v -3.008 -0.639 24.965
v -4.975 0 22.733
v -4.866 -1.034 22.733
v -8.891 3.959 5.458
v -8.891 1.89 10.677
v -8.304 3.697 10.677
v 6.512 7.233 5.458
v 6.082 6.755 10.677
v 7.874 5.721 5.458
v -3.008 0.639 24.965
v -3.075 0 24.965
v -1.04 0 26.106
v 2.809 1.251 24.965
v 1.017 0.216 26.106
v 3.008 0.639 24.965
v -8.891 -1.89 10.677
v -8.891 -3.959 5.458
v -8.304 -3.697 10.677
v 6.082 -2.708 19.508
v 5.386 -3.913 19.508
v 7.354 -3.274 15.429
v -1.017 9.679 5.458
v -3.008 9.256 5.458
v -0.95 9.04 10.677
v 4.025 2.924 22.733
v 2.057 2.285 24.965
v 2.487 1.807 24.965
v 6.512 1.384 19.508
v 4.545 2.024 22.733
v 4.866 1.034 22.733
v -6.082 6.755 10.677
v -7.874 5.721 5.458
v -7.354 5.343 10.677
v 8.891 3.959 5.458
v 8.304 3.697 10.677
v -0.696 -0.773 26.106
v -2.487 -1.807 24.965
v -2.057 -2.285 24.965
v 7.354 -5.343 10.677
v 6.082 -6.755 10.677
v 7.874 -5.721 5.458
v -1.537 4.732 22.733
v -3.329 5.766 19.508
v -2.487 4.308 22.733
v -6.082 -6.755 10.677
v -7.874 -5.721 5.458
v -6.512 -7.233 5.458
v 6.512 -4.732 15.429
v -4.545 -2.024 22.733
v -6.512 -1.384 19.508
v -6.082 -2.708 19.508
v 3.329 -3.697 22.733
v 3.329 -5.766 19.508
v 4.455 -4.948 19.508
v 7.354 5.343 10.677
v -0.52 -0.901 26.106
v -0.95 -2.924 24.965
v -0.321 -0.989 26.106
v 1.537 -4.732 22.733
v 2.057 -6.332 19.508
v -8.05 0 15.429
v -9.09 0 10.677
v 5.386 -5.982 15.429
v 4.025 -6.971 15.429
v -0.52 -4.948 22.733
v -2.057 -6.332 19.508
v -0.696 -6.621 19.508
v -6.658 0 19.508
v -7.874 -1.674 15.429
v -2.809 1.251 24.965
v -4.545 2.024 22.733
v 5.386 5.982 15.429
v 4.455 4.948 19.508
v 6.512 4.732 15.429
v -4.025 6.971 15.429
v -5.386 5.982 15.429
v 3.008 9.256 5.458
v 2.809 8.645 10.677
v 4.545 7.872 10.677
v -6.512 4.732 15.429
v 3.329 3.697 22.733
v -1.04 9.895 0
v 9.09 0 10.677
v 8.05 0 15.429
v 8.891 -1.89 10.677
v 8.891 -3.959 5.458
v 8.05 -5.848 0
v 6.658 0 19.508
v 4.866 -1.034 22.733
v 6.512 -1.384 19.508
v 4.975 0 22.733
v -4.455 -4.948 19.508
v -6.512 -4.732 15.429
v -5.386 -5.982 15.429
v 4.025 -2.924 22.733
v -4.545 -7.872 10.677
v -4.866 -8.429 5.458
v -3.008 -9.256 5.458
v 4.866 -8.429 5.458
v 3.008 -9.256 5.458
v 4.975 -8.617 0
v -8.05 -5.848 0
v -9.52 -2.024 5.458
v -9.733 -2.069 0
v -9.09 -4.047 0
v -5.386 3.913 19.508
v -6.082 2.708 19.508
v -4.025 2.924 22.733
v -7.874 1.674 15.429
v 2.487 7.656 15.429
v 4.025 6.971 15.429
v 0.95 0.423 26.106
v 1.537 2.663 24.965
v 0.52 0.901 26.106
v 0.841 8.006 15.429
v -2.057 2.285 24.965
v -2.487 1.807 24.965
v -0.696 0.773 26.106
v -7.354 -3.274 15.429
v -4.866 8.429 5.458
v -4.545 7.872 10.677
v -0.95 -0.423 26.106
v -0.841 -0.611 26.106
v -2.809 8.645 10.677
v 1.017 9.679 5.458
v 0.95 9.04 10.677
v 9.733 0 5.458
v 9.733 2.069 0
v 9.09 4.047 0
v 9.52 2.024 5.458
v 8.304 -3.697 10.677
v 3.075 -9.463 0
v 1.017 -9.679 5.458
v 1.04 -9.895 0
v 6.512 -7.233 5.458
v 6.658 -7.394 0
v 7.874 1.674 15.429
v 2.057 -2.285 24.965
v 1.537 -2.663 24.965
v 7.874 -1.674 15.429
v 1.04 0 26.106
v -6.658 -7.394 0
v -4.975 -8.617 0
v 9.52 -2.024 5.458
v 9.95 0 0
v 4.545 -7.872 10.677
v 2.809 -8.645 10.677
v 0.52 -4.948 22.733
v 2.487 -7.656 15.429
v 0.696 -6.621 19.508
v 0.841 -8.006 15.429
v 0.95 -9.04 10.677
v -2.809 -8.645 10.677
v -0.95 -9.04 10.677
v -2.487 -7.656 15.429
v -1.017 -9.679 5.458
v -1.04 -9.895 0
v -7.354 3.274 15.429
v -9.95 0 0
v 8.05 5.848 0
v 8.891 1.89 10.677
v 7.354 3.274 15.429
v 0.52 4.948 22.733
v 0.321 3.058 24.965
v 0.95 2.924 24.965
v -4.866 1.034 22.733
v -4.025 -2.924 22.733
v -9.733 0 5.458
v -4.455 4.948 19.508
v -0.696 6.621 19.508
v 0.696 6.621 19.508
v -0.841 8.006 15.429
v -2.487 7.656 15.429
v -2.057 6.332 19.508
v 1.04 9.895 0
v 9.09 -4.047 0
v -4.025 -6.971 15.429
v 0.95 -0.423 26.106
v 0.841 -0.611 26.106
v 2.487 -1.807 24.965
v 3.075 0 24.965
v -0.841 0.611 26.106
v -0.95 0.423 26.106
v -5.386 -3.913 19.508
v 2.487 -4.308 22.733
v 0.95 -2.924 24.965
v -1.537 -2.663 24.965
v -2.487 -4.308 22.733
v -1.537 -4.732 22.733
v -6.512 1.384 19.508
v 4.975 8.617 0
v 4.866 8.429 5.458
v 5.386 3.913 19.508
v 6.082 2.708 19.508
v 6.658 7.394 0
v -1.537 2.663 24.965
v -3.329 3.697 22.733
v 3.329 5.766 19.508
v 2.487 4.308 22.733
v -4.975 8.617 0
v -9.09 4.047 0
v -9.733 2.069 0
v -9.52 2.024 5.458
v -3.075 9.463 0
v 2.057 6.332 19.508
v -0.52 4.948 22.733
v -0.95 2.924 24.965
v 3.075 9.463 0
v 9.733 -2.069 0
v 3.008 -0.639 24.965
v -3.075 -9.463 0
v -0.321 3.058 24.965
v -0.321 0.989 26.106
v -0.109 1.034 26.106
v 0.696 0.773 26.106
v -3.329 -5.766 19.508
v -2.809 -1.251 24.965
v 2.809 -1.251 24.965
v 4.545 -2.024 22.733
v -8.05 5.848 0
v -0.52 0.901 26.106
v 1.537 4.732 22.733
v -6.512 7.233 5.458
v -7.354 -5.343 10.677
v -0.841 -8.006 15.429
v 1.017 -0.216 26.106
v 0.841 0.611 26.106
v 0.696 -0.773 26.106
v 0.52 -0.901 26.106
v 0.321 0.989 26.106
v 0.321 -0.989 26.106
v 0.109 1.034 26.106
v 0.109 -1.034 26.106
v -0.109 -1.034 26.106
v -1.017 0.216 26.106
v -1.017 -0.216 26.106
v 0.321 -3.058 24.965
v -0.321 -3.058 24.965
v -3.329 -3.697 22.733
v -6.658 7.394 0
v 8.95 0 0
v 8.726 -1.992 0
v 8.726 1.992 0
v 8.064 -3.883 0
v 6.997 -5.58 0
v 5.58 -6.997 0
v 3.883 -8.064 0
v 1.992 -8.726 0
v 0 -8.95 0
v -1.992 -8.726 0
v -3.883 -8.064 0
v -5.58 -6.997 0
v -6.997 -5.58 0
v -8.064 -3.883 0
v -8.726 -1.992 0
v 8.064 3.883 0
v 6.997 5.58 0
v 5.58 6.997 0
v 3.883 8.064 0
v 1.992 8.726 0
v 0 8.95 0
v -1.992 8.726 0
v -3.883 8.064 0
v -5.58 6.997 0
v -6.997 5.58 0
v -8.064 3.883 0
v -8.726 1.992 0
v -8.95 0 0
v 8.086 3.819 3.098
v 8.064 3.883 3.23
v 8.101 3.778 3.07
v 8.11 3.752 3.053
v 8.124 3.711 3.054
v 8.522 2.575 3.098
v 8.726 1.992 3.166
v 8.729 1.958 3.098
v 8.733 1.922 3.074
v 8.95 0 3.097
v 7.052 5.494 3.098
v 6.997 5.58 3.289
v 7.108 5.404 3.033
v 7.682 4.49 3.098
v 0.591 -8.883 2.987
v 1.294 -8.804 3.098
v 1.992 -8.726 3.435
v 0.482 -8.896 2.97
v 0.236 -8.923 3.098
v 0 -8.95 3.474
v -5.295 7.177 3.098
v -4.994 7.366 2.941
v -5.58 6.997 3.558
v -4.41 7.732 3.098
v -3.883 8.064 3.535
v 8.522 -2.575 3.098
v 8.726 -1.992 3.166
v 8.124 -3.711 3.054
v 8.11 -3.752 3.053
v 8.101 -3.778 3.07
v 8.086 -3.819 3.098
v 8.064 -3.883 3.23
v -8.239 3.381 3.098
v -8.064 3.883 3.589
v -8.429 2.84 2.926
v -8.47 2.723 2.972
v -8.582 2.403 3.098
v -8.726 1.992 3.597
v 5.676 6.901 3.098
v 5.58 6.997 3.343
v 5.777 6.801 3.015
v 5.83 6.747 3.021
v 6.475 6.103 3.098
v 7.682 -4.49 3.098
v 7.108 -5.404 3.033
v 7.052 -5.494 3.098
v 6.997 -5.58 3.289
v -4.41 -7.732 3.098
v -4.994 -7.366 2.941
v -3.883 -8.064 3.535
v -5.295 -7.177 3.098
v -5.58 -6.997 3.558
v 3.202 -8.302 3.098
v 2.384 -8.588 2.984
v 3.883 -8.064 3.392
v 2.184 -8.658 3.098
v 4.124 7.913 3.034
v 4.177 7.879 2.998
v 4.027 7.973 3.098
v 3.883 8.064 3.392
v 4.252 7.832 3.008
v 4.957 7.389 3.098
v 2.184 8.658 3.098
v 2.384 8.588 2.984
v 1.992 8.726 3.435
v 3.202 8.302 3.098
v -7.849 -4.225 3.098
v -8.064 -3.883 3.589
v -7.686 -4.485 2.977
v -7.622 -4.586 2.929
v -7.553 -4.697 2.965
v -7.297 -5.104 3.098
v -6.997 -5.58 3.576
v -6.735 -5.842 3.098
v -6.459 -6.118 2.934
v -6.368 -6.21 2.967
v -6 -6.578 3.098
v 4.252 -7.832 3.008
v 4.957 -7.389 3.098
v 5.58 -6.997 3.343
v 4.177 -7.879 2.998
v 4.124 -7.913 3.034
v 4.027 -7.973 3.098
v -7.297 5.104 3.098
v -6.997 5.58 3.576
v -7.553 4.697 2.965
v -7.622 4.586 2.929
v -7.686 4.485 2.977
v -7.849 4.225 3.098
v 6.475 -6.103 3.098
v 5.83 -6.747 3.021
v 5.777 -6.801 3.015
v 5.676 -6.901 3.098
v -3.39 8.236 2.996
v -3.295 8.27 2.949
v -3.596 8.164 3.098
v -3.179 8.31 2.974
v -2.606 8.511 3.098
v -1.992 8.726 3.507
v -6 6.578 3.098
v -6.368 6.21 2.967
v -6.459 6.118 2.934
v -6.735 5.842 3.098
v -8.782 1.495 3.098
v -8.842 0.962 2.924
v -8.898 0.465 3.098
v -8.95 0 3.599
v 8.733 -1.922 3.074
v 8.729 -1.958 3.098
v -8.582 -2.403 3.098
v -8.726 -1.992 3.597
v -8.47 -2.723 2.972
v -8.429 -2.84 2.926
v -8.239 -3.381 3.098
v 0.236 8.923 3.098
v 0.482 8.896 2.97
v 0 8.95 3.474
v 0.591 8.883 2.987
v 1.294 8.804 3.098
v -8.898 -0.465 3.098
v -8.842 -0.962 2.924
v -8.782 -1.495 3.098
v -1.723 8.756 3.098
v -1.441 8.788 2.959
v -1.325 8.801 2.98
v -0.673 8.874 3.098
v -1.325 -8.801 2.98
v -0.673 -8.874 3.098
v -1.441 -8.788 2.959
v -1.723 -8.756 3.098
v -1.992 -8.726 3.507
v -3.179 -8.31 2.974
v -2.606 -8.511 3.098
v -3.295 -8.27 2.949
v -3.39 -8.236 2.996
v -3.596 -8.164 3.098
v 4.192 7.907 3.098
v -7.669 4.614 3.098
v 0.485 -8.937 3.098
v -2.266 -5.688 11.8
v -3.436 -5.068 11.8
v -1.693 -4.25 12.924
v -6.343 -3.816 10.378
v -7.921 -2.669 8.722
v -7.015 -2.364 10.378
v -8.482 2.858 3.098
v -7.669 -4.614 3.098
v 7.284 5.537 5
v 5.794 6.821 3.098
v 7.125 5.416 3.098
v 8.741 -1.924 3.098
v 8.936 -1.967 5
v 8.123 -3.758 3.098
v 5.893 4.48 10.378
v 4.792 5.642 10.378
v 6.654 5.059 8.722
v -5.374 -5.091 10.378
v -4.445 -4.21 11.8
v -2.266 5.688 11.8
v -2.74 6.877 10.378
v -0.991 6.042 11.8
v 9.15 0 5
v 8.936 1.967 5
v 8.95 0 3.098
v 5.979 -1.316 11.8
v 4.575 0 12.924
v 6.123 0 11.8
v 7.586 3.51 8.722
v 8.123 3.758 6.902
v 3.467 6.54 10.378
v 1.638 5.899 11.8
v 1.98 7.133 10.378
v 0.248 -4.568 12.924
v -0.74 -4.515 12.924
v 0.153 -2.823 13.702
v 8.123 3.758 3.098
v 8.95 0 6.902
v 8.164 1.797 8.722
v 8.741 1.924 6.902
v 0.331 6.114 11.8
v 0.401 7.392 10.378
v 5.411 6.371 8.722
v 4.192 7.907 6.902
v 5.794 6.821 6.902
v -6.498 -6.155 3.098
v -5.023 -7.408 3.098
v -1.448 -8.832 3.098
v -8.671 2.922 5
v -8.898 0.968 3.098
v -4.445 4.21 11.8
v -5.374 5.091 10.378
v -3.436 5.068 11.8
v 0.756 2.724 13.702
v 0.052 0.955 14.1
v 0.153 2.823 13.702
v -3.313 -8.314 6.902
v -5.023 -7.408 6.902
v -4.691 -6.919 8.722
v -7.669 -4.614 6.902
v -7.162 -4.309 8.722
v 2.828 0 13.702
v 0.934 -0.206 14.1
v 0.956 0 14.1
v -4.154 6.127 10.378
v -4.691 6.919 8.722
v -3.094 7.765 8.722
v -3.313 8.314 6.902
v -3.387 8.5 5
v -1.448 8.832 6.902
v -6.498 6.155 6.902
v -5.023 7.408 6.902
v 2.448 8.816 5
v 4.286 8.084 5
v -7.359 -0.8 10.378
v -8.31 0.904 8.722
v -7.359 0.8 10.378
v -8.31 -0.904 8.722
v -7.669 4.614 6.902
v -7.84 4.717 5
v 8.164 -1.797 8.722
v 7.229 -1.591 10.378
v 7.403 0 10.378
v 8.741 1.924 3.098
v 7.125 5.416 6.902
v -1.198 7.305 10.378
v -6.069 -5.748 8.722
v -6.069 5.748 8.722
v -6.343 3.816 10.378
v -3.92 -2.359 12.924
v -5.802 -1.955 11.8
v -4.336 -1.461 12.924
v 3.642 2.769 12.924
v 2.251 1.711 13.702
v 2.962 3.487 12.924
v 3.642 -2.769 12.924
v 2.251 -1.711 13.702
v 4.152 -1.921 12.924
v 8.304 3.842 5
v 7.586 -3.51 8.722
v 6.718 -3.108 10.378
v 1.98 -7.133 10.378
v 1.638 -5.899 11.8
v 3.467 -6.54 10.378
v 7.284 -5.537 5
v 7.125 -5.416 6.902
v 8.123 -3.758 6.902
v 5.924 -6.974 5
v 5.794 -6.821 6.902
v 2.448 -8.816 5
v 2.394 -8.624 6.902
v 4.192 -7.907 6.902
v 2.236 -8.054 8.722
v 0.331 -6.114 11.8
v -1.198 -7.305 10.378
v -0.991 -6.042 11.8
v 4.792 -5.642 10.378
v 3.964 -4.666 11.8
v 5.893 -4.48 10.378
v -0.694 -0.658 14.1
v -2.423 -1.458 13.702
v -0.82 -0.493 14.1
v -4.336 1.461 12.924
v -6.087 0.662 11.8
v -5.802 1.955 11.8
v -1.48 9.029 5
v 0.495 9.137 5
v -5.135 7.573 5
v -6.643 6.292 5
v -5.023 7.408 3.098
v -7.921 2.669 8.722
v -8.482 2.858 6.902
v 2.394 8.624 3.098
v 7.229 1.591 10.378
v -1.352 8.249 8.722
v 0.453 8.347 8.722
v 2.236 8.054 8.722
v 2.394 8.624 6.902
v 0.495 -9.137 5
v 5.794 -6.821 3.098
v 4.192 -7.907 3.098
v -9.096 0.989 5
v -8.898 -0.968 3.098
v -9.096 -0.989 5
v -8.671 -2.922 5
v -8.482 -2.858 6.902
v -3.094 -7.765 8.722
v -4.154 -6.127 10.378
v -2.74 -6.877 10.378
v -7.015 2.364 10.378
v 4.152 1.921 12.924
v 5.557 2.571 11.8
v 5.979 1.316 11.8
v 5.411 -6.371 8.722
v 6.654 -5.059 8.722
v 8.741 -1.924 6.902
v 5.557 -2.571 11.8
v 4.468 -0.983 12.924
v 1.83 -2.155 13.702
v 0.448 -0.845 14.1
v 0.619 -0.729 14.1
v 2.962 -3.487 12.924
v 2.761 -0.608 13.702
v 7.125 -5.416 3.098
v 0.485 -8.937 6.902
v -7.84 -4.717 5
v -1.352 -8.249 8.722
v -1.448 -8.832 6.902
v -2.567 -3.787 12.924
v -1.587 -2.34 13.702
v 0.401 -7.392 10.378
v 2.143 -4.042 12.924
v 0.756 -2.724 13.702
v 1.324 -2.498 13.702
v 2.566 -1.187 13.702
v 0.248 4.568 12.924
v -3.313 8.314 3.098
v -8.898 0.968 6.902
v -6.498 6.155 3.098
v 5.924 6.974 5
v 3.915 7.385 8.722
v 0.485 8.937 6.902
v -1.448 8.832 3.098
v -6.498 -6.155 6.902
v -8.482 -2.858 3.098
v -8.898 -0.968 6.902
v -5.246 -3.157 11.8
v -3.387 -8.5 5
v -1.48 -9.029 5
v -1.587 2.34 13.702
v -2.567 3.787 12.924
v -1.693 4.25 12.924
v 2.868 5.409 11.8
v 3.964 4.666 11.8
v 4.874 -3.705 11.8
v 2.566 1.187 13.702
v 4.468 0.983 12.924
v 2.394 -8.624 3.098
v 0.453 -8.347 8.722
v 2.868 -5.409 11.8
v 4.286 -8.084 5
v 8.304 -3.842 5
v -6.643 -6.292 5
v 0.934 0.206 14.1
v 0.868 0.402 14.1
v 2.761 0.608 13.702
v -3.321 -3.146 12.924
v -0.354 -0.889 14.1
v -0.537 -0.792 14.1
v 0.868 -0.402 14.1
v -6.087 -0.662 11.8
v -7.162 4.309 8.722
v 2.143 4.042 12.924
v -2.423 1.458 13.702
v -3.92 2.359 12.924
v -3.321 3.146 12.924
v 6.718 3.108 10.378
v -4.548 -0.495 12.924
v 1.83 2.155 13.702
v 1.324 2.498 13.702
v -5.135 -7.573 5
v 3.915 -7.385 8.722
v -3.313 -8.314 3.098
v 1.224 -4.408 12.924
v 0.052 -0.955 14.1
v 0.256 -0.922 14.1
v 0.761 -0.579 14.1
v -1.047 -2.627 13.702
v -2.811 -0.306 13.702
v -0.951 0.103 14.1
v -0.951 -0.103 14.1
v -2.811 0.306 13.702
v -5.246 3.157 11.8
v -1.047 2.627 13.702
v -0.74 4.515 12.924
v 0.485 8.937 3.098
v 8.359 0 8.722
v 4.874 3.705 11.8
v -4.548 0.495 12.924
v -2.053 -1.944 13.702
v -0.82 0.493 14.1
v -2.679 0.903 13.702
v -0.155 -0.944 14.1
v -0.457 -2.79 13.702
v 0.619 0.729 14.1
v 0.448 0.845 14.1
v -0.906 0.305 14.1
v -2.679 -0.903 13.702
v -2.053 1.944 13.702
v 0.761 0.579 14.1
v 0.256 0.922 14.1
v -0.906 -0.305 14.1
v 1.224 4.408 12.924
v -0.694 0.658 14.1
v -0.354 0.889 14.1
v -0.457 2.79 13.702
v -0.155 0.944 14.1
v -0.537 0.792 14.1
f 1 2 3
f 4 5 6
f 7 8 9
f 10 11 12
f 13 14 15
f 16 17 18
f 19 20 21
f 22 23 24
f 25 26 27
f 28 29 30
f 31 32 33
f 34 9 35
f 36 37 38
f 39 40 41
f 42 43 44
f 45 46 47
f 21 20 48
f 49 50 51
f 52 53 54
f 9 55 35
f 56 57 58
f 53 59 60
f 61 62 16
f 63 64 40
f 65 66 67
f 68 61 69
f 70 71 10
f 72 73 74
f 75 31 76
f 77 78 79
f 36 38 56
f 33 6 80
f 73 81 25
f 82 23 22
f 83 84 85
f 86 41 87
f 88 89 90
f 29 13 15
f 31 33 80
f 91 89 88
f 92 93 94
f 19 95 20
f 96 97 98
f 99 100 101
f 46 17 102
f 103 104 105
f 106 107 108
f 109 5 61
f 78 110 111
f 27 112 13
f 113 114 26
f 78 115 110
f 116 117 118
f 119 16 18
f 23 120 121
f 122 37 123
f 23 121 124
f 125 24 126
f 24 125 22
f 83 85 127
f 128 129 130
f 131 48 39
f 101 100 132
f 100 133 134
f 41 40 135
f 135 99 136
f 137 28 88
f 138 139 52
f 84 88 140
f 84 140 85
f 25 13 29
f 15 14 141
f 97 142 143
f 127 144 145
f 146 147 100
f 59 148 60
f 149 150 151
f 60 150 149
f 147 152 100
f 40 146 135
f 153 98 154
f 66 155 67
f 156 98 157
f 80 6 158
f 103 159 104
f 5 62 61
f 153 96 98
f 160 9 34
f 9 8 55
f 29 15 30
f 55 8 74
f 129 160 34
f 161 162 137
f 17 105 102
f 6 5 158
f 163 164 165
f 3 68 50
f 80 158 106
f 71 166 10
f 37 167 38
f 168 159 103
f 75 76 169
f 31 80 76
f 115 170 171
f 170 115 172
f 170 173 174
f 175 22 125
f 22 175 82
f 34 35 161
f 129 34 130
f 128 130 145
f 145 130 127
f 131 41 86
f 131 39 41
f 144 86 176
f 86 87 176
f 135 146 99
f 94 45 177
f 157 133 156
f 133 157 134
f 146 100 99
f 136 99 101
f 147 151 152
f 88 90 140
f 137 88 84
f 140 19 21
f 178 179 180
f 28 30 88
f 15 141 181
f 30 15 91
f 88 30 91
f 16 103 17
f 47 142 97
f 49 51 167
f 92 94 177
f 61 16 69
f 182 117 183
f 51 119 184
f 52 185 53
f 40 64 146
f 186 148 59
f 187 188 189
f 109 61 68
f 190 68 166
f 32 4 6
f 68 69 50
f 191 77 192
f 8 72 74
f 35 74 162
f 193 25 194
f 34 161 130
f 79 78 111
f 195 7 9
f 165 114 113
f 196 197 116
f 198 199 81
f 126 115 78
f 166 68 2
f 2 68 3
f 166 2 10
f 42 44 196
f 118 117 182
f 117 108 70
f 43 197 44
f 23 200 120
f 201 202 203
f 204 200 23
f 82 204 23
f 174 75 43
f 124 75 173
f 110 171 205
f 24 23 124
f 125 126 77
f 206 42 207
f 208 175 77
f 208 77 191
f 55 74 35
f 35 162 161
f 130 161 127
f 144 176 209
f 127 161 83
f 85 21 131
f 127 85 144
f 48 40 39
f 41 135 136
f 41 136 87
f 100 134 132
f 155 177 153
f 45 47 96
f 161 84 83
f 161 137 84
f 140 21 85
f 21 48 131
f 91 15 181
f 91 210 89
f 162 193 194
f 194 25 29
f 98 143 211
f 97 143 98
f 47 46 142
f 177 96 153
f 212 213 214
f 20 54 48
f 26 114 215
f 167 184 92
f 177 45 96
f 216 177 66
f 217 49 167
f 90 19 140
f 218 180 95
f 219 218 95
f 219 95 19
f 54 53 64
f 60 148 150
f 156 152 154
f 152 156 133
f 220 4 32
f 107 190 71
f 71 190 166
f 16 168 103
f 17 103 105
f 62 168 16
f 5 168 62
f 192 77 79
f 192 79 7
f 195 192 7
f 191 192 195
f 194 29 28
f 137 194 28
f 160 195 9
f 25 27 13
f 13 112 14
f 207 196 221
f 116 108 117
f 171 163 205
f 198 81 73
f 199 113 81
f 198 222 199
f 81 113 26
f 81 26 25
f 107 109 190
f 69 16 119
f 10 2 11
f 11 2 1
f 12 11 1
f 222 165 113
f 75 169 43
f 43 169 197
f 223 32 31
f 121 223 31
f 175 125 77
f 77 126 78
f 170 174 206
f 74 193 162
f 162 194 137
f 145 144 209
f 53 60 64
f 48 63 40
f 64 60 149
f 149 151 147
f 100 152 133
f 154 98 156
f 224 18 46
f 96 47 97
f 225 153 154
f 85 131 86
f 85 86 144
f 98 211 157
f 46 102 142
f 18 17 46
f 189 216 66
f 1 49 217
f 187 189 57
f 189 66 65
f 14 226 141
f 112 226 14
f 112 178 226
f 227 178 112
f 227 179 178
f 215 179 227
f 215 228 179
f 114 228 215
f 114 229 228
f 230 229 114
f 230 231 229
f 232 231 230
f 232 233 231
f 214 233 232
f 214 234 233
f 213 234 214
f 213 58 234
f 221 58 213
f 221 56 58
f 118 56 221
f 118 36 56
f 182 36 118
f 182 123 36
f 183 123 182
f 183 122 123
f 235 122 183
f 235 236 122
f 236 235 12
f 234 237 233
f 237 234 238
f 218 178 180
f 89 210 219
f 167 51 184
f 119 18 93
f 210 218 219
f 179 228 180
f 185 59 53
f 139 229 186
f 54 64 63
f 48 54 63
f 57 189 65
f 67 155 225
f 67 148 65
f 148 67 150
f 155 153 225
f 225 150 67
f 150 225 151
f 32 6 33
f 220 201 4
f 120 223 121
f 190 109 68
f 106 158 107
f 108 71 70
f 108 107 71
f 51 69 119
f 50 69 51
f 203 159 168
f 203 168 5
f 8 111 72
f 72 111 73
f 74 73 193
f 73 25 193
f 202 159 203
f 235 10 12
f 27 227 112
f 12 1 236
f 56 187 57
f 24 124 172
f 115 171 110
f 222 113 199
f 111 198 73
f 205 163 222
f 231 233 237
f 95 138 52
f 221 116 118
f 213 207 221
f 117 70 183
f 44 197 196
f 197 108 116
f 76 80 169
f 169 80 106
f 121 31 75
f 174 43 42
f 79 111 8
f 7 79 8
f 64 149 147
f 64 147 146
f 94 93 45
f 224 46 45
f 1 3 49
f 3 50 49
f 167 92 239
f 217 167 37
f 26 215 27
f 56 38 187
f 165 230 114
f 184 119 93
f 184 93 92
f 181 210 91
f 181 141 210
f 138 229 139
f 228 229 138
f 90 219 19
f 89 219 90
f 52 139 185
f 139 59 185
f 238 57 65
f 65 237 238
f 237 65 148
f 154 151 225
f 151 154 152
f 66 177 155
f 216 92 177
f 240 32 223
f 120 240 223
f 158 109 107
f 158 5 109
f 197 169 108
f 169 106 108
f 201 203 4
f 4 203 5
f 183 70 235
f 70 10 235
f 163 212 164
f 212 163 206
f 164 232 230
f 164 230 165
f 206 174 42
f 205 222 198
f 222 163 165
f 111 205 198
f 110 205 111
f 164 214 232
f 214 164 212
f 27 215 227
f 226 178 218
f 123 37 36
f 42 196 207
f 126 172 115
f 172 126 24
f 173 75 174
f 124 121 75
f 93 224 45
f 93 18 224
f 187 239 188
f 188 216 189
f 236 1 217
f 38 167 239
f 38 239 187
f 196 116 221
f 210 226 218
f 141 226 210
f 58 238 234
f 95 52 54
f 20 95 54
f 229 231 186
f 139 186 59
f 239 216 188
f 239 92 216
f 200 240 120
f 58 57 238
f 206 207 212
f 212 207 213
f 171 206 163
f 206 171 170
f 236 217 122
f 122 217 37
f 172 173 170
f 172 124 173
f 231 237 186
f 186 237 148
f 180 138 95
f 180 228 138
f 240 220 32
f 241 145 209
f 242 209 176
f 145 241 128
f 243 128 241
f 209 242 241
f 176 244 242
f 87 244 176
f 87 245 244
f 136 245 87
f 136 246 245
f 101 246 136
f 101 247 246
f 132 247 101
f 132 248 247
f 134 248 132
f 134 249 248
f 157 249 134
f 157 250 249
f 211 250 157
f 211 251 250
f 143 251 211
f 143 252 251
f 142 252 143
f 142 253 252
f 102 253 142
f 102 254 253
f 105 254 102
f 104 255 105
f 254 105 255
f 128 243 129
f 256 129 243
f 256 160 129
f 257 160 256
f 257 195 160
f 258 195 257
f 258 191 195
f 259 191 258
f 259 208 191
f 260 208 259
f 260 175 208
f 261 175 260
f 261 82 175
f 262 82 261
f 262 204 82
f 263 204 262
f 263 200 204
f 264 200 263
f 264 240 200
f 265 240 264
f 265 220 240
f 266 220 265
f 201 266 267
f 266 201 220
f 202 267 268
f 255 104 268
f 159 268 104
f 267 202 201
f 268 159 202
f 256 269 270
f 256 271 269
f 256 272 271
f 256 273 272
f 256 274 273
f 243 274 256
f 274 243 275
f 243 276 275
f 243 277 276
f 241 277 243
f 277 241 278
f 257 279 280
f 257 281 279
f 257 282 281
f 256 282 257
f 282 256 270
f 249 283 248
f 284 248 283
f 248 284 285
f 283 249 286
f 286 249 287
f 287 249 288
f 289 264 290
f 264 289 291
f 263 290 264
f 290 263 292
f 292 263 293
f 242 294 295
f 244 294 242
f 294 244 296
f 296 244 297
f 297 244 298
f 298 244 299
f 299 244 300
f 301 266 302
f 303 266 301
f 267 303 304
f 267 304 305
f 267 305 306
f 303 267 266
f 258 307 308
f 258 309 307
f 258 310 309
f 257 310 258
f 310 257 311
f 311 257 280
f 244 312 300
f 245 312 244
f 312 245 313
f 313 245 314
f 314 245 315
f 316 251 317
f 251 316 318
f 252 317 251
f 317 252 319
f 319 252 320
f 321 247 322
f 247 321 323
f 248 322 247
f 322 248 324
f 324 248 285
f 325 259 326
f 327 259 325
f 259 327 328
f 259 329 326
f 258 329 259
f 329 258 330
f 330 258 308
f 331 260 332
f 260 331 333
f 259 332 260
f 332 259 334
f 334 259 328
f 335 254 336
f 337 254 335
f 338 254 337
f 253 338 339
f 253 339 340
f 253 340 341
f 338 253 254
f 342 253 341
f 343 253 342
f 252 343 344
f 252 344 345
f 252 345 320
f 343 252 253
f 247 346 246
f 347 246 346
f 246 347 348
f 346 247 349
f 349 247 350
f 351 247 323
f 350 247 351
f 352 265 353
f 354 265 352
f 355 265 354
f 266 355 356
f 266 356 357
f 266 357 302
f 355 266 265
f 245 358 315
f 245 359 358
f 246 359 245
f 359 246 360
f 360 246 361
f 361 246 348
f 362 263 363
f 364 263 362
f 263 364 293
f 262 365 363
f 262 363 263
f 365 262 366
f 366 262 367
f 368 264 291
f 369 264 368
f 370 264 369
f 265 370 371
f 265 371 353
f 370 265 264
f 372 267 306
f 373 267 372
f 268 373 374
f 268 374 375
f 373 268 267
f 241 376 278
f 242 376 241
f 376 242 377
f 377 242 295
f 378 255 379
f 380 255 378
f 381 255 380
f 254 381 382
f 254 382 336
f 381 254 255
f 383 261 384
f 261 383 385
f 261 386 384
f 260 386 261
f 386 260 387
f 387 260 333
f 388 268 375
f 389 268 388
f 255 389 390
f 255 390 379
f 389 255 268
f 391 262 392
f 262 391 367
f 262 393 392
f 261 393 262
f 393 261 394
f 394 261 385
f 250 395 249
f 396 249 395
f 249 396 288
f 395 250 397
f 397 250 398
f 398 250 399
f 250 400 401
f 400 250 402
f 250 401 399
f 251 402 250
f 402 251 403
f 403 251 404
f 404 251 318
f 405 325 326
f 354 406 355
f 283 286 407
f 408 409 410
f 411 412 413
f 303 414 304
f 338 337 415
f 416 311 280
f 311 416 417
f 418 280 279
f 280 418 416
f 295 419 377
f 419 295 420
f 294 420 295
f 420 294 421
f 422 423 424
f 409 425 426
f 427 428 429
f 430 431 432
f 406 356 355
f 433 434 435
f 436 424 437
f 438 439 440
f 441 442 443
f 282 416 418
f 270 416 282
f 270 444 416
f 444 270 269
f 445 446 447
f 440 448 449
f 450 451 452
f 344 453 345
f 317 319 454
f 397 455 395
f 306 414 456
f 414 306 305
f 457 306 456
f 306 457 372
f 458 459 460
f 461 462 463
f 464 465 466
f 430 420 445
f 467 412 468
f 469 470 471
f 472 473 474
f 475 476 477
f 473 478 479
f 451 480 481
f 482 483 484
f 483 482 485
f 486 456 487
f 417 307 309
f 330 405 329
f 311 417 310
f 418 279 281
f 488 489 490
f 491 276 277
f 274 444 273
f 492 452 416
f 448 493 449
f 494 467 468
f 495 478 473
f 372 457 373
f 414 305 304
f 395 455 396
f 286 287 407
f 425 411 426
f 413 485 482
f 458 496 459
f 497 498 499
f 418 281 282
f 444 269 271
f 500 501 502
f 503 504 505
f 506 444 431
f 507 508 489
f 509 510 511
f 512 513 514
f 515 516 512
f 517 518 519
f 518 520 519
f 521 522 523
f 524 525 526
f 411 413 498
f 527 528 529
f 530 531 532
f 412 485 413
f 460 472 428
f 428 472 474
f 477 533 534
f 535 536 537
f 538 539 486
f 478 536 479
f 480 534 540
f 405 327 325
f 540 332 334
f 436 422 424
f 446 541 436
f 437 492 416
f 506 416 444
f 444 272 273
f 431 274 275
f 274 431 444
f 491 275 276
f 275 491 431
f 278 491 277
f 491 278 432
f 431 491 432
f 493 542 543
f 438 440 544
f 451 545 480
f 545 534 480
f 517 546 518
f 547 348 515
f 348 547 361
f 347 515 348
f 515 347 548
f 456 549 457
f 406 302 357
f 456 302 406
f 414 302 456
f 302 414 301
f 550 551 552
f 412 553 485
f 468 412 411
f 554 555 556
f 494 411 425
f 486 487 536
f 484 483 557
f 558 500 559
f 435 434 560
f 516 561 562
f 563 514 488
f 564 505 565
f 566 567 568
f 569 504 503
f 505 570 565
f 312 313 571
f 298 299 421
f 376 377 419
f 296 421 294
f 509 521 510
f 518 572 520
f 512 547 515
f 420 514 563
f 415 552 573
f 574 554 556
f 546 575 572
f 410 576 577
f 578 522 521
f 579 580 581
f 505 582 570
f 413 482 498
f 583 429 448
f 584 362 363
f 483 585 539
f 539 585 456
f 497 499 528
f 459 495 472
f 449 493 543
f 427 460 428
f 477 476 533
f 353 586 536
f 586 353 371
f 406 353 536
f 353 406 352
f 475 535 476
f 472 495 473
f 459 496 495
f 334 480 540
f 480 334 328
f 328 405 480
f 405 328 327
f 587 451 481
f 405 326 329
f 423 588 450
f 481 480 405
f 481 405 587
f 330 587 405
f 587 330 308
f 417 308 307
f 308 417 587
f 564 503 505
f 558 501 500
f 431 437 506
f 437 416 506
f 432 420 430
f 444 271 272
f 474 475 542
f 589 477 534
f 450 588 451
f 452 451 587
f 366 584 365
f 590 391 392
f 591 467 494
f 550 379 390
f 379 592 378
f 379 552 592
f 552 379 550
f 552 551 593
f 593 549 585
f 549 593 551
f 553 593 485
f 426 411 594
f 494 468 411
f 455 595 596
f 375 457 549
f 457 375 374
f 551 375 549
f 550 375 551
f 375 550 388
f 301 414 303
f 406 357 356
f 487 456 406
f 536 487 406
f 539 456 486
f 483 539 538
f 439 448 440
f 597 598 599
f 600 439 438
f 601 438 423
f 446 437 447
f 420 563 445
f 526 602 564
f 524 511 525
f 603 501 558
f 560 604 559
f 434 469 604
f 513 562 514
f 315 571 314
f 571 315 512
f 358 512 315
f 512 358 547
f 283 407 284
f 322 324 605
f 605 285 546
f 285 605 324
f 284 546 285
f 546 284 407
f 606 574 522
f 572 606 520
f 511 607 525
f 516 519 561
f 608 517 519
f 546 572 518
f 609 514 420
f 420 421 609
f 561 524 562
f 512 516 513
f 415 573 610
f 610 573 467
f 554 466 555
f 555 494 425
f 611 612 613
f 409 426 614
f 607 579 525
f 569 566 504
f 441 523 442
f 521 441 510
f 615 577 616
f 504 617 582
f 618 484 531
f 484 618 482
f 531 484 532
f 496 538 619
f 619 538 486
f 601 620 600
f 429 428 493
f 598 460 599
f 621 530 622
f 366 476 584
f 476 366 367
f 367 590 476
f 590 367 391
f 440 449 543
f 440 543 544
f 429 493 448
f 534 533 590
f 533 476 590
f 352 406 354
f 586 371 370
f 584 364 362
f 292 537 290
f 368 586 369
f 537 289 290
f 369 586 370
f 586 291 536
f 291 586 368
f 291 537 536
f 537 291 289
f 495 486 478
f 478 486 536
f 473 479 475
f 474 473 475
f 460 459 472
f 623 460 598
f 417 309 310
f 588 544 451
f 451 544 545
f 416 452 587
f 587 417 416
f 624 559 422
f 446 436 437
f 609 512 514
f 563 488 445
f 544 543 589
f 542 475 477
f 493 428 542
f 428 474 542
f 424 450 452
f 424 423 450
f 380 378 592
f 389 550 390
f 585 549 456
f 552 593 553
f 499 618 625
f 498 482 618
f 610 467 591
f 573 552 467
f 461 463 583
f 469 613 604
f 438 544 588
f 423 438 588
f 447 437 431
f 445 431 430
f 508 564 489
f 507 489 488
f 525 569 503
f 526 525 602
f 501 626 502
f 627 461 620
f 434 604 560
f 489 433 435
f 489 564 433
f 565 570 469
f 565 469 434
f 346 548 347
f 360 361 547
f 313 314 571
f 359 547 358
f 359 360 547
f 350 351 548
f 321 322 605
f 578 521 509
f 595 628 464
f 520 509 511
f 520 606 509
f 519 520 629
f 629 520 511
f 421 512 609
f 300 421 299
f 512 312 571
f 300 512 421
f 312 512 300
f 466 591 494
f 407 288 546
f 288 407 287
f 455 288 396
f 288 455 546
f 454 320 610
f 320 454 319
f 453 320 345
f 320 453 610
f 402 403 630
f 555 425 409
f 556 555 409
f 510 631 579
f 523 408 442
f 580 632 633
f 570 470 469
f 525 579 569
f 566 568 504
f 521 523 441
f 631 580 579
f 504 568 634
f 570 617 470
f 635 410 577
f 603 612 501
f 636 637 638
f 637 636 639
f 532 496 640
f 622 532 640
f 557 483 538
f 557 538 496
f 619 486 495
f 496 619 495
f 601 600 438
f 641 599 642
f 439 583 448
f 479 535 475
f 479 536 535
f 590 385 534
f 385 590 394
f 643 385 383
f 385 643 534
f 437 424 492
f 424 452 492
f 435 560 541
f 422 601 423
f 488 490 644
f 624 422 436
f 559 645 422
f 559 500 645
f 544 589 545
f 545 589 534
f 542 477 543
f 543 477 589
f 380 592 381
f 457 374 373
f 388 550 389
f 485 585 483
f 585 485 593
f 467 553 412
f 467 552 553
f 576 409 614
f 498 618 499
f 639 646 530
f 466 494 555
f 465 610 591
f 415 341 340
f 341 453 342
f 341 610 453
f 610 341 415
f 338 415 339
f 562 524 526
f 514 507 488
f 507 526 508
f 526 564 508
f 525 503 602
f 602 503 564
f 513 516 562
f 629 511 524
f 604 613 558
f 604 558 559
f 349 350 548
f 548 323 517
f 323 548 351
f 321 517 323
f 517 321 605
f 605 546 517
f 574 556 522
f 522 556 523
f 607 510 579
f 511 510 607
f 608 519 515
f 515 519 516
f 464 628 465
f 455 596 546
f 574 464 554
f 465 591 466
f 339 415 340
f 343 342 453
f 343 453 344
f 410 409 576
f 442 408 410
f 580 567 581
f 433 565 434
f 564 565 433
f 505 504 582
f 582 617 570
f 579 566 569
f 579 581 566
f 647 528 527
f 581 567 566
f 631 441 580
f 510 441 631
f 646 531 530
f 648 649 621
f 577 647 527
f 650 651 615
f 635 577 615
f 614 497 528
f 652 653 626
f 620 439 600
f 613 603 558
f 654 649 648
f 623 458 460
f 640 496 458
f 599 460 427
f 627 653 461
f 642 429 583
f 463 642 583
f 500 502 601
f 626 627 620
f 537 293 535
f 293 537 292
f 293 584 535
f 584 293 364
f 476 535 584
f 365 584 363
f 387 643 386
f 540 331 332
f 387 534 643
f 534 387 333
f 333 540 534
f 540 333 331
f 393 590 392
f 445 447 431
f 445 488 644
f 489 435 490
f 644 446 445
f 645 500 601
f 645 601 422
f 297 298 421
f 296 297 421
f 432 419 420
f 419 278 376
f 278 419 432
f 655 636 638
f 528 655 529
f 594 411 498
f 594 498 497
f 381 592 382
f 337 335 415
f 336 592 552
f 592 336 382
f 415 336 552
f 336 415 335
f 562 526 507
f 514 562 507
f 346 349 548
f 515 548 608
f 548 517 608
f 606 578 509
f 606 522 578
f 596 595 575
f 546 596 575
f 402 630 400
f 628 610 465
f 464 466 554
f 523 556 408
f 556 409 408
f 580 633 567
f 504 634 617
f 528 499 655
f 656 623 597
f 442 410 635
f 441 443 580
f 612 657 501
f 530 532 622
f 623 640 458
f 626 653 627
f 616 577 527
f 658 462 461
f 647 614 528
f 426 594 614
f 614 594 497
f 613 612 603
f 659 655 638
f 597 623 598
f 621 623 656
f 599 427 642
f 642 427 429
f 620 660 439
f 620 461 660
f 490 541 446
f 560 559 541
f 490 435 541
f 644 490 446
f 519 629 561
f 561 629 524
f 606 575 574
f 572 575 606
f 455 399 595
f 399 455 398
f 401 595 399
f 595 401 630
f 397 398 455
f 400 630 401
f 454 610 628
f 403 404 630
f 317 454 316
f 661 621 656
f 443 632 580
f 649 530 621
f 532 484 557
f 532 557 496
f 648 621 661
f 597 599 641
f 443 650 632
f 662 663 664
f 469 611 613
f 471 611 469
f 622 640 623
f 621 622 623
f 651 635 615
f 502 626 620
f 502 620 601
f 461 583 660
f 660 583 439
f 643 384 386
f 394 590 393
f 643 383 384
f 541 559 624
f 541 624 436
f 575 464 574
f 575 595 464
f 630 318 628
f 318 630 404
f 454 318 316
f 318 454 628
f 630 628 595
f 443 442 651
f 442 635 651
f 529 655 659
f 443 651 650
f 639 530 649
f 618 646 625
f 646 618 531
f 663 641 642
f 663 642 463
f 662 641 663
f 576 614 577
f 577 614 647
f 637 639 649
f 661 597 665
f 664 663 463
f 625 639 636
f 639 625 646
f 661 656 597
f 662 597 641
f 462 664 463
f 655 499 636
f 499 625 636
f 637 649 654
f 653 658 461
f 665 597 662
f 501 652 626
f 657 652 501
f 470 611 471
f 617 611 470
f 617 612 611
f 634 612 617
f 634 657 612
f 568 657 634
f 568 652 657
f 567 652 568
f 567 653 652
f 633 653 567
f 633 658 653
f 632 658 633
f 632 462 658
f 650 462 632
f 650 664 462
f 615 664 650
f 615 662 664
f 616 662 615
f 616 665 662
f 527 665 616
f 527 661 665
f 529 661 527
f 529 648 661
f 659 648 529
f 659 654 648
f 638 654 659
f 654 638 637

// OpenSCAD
ARR = "print";
tol = 0.4;

engine_radius = 17.5 / 2;
engine_height = 70;

nose_assembly_height = 26.25;
nose_assembly_thickness = 1.2;
nose_assembly_slot_height = 5;
nose_assembly_radius = engine_radius + nose_assembly_thickness;

module with_tol(size) {
  resize(size + tol * [1, 1, 1]) {
    children();
  }
}

// chops off model on entire side of plane
module chop(r, plane) {
  difference() {
    children();

    theta = plane[0] == 0 ? 0 : atan(plane[1] / plane[0]);
    phi_abs = atan(sqrt(pow(plane[0], 2) + pow(plane[1], 2)) / plane[2]);
    phi_sign = plane[0] > 0 ? phi_abs : -phi_abs;
    phi = plane[2] >= 0 ? phi_sign : phi_sign + 180;
    
    // cut off below plane
    rotate([0, 0, theta])
      rotate([0, phi, 0])
        translate(-r * [0, 0, 1])
          //with_tol((2 * r) * [1, 1, 1])
            cube((2 * r) * [1, 1, 1], true);
  }
}

module a8_3_engine() {
  with_tol([engine_radius * 2, engine_radius * 2, engine_height]) {
    cylinder(engine_height, engine_radius, engine_radius);
  }
}

module parabolic_cone(height, radius) {
  chop(10, [0, 0, 1]) {
    scale([1, 1, height / radius]) {
      sphere(radius);
    }
  }
}

module nose_assembly(height, radius, thickness, slot_inset) {
  difference() {
    // the nose cone
    parabolic_cone(height, radius);

    translate([0, 0, slot_inset]) {
      mirror([0, 0, 1]) {
        // the engine
        // remove the '%' that was in front of the cylinder()
        a8_3_engine();

        // the inner dome
        sphere(radius - thickness + tol);
      }
    }
  }
}

module buri() {
  if (ARR == "assembly") {
    // The arragement when the part is assembled
  } else if (ARR == "explode") {
    // The arragement when the part is exploded
  } else if (ARR == "print") {
    // The arragement when the part is to be printed

    nose_assembly(nose_assembly_height, nose_assembly_radius,
                  nose_assembly_thickness, nose_assembly_slot_height);
  }
}

buri();
